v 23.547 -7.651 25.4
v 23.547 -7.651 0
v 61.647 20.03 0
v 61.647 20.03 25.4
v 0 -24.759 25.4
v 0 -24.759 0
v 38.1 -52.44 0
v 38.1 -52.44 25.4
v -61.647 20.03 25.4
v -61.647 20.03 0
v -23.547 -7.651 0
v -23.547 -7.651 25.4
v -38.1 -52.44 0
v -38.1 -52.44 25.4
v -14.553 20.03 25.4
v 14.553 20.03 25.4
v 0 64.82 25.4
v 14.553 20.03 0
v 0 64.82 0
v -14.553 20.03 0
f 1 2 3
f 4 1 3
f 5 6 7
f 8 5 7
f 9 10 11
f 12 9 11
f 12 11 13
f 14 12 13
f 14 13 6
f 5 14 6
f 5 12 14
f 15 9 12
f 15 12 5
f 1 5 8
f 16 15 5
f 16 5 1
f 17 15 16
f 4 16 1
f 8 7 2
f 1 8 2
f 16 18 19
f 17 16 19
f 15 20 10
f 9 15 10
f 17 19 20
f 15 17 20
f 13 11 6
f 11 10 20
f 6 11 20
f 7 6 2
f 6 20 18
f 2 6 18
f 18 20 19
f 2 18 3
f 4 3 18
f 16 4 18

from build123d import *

# Parameters (mm, degrees)
F1_DEPTH = 25.4


with BuildPart() as f1:
    # F0 (on Top) → F1 (new body)
    with BuildSketch(Plane.XY):
        Polygon((14.5529050286, 20.0303553717), (0, 64.8195915964), (-14.5529050286, 20.0303553717), align=None)
        Polygon((-14.5529050286, 20.0303553717), (-61.6470949714, 20.0303553717), (-23.5470949714, -7.6509149453), align=None)
        Polygon((-23.5470949714, -7.6509149453), (-38.1, -52.44015117), (0, -24.7588808529), align=None)
        Polygon((23.5470949714, -7.6509149453), (61.6470949714, 20.0303553717), (14.5529050286, 20.0303553717), align=None)
        Polygon((0, -24.7588808529), (38.1, -52.44015117), (23.5470949714, -7.6509149453), align=None)
        Polygon((14.5529050286, 20.0303553717), (-14.5529050286, 20.0303553717), (-23.5470949714, -7.6509149453), (0, -24.7588808529), (23.5470949714, -7.6509149453), align=None)
    extrude(amount=F1_DEPTH)


solid = f1.part
